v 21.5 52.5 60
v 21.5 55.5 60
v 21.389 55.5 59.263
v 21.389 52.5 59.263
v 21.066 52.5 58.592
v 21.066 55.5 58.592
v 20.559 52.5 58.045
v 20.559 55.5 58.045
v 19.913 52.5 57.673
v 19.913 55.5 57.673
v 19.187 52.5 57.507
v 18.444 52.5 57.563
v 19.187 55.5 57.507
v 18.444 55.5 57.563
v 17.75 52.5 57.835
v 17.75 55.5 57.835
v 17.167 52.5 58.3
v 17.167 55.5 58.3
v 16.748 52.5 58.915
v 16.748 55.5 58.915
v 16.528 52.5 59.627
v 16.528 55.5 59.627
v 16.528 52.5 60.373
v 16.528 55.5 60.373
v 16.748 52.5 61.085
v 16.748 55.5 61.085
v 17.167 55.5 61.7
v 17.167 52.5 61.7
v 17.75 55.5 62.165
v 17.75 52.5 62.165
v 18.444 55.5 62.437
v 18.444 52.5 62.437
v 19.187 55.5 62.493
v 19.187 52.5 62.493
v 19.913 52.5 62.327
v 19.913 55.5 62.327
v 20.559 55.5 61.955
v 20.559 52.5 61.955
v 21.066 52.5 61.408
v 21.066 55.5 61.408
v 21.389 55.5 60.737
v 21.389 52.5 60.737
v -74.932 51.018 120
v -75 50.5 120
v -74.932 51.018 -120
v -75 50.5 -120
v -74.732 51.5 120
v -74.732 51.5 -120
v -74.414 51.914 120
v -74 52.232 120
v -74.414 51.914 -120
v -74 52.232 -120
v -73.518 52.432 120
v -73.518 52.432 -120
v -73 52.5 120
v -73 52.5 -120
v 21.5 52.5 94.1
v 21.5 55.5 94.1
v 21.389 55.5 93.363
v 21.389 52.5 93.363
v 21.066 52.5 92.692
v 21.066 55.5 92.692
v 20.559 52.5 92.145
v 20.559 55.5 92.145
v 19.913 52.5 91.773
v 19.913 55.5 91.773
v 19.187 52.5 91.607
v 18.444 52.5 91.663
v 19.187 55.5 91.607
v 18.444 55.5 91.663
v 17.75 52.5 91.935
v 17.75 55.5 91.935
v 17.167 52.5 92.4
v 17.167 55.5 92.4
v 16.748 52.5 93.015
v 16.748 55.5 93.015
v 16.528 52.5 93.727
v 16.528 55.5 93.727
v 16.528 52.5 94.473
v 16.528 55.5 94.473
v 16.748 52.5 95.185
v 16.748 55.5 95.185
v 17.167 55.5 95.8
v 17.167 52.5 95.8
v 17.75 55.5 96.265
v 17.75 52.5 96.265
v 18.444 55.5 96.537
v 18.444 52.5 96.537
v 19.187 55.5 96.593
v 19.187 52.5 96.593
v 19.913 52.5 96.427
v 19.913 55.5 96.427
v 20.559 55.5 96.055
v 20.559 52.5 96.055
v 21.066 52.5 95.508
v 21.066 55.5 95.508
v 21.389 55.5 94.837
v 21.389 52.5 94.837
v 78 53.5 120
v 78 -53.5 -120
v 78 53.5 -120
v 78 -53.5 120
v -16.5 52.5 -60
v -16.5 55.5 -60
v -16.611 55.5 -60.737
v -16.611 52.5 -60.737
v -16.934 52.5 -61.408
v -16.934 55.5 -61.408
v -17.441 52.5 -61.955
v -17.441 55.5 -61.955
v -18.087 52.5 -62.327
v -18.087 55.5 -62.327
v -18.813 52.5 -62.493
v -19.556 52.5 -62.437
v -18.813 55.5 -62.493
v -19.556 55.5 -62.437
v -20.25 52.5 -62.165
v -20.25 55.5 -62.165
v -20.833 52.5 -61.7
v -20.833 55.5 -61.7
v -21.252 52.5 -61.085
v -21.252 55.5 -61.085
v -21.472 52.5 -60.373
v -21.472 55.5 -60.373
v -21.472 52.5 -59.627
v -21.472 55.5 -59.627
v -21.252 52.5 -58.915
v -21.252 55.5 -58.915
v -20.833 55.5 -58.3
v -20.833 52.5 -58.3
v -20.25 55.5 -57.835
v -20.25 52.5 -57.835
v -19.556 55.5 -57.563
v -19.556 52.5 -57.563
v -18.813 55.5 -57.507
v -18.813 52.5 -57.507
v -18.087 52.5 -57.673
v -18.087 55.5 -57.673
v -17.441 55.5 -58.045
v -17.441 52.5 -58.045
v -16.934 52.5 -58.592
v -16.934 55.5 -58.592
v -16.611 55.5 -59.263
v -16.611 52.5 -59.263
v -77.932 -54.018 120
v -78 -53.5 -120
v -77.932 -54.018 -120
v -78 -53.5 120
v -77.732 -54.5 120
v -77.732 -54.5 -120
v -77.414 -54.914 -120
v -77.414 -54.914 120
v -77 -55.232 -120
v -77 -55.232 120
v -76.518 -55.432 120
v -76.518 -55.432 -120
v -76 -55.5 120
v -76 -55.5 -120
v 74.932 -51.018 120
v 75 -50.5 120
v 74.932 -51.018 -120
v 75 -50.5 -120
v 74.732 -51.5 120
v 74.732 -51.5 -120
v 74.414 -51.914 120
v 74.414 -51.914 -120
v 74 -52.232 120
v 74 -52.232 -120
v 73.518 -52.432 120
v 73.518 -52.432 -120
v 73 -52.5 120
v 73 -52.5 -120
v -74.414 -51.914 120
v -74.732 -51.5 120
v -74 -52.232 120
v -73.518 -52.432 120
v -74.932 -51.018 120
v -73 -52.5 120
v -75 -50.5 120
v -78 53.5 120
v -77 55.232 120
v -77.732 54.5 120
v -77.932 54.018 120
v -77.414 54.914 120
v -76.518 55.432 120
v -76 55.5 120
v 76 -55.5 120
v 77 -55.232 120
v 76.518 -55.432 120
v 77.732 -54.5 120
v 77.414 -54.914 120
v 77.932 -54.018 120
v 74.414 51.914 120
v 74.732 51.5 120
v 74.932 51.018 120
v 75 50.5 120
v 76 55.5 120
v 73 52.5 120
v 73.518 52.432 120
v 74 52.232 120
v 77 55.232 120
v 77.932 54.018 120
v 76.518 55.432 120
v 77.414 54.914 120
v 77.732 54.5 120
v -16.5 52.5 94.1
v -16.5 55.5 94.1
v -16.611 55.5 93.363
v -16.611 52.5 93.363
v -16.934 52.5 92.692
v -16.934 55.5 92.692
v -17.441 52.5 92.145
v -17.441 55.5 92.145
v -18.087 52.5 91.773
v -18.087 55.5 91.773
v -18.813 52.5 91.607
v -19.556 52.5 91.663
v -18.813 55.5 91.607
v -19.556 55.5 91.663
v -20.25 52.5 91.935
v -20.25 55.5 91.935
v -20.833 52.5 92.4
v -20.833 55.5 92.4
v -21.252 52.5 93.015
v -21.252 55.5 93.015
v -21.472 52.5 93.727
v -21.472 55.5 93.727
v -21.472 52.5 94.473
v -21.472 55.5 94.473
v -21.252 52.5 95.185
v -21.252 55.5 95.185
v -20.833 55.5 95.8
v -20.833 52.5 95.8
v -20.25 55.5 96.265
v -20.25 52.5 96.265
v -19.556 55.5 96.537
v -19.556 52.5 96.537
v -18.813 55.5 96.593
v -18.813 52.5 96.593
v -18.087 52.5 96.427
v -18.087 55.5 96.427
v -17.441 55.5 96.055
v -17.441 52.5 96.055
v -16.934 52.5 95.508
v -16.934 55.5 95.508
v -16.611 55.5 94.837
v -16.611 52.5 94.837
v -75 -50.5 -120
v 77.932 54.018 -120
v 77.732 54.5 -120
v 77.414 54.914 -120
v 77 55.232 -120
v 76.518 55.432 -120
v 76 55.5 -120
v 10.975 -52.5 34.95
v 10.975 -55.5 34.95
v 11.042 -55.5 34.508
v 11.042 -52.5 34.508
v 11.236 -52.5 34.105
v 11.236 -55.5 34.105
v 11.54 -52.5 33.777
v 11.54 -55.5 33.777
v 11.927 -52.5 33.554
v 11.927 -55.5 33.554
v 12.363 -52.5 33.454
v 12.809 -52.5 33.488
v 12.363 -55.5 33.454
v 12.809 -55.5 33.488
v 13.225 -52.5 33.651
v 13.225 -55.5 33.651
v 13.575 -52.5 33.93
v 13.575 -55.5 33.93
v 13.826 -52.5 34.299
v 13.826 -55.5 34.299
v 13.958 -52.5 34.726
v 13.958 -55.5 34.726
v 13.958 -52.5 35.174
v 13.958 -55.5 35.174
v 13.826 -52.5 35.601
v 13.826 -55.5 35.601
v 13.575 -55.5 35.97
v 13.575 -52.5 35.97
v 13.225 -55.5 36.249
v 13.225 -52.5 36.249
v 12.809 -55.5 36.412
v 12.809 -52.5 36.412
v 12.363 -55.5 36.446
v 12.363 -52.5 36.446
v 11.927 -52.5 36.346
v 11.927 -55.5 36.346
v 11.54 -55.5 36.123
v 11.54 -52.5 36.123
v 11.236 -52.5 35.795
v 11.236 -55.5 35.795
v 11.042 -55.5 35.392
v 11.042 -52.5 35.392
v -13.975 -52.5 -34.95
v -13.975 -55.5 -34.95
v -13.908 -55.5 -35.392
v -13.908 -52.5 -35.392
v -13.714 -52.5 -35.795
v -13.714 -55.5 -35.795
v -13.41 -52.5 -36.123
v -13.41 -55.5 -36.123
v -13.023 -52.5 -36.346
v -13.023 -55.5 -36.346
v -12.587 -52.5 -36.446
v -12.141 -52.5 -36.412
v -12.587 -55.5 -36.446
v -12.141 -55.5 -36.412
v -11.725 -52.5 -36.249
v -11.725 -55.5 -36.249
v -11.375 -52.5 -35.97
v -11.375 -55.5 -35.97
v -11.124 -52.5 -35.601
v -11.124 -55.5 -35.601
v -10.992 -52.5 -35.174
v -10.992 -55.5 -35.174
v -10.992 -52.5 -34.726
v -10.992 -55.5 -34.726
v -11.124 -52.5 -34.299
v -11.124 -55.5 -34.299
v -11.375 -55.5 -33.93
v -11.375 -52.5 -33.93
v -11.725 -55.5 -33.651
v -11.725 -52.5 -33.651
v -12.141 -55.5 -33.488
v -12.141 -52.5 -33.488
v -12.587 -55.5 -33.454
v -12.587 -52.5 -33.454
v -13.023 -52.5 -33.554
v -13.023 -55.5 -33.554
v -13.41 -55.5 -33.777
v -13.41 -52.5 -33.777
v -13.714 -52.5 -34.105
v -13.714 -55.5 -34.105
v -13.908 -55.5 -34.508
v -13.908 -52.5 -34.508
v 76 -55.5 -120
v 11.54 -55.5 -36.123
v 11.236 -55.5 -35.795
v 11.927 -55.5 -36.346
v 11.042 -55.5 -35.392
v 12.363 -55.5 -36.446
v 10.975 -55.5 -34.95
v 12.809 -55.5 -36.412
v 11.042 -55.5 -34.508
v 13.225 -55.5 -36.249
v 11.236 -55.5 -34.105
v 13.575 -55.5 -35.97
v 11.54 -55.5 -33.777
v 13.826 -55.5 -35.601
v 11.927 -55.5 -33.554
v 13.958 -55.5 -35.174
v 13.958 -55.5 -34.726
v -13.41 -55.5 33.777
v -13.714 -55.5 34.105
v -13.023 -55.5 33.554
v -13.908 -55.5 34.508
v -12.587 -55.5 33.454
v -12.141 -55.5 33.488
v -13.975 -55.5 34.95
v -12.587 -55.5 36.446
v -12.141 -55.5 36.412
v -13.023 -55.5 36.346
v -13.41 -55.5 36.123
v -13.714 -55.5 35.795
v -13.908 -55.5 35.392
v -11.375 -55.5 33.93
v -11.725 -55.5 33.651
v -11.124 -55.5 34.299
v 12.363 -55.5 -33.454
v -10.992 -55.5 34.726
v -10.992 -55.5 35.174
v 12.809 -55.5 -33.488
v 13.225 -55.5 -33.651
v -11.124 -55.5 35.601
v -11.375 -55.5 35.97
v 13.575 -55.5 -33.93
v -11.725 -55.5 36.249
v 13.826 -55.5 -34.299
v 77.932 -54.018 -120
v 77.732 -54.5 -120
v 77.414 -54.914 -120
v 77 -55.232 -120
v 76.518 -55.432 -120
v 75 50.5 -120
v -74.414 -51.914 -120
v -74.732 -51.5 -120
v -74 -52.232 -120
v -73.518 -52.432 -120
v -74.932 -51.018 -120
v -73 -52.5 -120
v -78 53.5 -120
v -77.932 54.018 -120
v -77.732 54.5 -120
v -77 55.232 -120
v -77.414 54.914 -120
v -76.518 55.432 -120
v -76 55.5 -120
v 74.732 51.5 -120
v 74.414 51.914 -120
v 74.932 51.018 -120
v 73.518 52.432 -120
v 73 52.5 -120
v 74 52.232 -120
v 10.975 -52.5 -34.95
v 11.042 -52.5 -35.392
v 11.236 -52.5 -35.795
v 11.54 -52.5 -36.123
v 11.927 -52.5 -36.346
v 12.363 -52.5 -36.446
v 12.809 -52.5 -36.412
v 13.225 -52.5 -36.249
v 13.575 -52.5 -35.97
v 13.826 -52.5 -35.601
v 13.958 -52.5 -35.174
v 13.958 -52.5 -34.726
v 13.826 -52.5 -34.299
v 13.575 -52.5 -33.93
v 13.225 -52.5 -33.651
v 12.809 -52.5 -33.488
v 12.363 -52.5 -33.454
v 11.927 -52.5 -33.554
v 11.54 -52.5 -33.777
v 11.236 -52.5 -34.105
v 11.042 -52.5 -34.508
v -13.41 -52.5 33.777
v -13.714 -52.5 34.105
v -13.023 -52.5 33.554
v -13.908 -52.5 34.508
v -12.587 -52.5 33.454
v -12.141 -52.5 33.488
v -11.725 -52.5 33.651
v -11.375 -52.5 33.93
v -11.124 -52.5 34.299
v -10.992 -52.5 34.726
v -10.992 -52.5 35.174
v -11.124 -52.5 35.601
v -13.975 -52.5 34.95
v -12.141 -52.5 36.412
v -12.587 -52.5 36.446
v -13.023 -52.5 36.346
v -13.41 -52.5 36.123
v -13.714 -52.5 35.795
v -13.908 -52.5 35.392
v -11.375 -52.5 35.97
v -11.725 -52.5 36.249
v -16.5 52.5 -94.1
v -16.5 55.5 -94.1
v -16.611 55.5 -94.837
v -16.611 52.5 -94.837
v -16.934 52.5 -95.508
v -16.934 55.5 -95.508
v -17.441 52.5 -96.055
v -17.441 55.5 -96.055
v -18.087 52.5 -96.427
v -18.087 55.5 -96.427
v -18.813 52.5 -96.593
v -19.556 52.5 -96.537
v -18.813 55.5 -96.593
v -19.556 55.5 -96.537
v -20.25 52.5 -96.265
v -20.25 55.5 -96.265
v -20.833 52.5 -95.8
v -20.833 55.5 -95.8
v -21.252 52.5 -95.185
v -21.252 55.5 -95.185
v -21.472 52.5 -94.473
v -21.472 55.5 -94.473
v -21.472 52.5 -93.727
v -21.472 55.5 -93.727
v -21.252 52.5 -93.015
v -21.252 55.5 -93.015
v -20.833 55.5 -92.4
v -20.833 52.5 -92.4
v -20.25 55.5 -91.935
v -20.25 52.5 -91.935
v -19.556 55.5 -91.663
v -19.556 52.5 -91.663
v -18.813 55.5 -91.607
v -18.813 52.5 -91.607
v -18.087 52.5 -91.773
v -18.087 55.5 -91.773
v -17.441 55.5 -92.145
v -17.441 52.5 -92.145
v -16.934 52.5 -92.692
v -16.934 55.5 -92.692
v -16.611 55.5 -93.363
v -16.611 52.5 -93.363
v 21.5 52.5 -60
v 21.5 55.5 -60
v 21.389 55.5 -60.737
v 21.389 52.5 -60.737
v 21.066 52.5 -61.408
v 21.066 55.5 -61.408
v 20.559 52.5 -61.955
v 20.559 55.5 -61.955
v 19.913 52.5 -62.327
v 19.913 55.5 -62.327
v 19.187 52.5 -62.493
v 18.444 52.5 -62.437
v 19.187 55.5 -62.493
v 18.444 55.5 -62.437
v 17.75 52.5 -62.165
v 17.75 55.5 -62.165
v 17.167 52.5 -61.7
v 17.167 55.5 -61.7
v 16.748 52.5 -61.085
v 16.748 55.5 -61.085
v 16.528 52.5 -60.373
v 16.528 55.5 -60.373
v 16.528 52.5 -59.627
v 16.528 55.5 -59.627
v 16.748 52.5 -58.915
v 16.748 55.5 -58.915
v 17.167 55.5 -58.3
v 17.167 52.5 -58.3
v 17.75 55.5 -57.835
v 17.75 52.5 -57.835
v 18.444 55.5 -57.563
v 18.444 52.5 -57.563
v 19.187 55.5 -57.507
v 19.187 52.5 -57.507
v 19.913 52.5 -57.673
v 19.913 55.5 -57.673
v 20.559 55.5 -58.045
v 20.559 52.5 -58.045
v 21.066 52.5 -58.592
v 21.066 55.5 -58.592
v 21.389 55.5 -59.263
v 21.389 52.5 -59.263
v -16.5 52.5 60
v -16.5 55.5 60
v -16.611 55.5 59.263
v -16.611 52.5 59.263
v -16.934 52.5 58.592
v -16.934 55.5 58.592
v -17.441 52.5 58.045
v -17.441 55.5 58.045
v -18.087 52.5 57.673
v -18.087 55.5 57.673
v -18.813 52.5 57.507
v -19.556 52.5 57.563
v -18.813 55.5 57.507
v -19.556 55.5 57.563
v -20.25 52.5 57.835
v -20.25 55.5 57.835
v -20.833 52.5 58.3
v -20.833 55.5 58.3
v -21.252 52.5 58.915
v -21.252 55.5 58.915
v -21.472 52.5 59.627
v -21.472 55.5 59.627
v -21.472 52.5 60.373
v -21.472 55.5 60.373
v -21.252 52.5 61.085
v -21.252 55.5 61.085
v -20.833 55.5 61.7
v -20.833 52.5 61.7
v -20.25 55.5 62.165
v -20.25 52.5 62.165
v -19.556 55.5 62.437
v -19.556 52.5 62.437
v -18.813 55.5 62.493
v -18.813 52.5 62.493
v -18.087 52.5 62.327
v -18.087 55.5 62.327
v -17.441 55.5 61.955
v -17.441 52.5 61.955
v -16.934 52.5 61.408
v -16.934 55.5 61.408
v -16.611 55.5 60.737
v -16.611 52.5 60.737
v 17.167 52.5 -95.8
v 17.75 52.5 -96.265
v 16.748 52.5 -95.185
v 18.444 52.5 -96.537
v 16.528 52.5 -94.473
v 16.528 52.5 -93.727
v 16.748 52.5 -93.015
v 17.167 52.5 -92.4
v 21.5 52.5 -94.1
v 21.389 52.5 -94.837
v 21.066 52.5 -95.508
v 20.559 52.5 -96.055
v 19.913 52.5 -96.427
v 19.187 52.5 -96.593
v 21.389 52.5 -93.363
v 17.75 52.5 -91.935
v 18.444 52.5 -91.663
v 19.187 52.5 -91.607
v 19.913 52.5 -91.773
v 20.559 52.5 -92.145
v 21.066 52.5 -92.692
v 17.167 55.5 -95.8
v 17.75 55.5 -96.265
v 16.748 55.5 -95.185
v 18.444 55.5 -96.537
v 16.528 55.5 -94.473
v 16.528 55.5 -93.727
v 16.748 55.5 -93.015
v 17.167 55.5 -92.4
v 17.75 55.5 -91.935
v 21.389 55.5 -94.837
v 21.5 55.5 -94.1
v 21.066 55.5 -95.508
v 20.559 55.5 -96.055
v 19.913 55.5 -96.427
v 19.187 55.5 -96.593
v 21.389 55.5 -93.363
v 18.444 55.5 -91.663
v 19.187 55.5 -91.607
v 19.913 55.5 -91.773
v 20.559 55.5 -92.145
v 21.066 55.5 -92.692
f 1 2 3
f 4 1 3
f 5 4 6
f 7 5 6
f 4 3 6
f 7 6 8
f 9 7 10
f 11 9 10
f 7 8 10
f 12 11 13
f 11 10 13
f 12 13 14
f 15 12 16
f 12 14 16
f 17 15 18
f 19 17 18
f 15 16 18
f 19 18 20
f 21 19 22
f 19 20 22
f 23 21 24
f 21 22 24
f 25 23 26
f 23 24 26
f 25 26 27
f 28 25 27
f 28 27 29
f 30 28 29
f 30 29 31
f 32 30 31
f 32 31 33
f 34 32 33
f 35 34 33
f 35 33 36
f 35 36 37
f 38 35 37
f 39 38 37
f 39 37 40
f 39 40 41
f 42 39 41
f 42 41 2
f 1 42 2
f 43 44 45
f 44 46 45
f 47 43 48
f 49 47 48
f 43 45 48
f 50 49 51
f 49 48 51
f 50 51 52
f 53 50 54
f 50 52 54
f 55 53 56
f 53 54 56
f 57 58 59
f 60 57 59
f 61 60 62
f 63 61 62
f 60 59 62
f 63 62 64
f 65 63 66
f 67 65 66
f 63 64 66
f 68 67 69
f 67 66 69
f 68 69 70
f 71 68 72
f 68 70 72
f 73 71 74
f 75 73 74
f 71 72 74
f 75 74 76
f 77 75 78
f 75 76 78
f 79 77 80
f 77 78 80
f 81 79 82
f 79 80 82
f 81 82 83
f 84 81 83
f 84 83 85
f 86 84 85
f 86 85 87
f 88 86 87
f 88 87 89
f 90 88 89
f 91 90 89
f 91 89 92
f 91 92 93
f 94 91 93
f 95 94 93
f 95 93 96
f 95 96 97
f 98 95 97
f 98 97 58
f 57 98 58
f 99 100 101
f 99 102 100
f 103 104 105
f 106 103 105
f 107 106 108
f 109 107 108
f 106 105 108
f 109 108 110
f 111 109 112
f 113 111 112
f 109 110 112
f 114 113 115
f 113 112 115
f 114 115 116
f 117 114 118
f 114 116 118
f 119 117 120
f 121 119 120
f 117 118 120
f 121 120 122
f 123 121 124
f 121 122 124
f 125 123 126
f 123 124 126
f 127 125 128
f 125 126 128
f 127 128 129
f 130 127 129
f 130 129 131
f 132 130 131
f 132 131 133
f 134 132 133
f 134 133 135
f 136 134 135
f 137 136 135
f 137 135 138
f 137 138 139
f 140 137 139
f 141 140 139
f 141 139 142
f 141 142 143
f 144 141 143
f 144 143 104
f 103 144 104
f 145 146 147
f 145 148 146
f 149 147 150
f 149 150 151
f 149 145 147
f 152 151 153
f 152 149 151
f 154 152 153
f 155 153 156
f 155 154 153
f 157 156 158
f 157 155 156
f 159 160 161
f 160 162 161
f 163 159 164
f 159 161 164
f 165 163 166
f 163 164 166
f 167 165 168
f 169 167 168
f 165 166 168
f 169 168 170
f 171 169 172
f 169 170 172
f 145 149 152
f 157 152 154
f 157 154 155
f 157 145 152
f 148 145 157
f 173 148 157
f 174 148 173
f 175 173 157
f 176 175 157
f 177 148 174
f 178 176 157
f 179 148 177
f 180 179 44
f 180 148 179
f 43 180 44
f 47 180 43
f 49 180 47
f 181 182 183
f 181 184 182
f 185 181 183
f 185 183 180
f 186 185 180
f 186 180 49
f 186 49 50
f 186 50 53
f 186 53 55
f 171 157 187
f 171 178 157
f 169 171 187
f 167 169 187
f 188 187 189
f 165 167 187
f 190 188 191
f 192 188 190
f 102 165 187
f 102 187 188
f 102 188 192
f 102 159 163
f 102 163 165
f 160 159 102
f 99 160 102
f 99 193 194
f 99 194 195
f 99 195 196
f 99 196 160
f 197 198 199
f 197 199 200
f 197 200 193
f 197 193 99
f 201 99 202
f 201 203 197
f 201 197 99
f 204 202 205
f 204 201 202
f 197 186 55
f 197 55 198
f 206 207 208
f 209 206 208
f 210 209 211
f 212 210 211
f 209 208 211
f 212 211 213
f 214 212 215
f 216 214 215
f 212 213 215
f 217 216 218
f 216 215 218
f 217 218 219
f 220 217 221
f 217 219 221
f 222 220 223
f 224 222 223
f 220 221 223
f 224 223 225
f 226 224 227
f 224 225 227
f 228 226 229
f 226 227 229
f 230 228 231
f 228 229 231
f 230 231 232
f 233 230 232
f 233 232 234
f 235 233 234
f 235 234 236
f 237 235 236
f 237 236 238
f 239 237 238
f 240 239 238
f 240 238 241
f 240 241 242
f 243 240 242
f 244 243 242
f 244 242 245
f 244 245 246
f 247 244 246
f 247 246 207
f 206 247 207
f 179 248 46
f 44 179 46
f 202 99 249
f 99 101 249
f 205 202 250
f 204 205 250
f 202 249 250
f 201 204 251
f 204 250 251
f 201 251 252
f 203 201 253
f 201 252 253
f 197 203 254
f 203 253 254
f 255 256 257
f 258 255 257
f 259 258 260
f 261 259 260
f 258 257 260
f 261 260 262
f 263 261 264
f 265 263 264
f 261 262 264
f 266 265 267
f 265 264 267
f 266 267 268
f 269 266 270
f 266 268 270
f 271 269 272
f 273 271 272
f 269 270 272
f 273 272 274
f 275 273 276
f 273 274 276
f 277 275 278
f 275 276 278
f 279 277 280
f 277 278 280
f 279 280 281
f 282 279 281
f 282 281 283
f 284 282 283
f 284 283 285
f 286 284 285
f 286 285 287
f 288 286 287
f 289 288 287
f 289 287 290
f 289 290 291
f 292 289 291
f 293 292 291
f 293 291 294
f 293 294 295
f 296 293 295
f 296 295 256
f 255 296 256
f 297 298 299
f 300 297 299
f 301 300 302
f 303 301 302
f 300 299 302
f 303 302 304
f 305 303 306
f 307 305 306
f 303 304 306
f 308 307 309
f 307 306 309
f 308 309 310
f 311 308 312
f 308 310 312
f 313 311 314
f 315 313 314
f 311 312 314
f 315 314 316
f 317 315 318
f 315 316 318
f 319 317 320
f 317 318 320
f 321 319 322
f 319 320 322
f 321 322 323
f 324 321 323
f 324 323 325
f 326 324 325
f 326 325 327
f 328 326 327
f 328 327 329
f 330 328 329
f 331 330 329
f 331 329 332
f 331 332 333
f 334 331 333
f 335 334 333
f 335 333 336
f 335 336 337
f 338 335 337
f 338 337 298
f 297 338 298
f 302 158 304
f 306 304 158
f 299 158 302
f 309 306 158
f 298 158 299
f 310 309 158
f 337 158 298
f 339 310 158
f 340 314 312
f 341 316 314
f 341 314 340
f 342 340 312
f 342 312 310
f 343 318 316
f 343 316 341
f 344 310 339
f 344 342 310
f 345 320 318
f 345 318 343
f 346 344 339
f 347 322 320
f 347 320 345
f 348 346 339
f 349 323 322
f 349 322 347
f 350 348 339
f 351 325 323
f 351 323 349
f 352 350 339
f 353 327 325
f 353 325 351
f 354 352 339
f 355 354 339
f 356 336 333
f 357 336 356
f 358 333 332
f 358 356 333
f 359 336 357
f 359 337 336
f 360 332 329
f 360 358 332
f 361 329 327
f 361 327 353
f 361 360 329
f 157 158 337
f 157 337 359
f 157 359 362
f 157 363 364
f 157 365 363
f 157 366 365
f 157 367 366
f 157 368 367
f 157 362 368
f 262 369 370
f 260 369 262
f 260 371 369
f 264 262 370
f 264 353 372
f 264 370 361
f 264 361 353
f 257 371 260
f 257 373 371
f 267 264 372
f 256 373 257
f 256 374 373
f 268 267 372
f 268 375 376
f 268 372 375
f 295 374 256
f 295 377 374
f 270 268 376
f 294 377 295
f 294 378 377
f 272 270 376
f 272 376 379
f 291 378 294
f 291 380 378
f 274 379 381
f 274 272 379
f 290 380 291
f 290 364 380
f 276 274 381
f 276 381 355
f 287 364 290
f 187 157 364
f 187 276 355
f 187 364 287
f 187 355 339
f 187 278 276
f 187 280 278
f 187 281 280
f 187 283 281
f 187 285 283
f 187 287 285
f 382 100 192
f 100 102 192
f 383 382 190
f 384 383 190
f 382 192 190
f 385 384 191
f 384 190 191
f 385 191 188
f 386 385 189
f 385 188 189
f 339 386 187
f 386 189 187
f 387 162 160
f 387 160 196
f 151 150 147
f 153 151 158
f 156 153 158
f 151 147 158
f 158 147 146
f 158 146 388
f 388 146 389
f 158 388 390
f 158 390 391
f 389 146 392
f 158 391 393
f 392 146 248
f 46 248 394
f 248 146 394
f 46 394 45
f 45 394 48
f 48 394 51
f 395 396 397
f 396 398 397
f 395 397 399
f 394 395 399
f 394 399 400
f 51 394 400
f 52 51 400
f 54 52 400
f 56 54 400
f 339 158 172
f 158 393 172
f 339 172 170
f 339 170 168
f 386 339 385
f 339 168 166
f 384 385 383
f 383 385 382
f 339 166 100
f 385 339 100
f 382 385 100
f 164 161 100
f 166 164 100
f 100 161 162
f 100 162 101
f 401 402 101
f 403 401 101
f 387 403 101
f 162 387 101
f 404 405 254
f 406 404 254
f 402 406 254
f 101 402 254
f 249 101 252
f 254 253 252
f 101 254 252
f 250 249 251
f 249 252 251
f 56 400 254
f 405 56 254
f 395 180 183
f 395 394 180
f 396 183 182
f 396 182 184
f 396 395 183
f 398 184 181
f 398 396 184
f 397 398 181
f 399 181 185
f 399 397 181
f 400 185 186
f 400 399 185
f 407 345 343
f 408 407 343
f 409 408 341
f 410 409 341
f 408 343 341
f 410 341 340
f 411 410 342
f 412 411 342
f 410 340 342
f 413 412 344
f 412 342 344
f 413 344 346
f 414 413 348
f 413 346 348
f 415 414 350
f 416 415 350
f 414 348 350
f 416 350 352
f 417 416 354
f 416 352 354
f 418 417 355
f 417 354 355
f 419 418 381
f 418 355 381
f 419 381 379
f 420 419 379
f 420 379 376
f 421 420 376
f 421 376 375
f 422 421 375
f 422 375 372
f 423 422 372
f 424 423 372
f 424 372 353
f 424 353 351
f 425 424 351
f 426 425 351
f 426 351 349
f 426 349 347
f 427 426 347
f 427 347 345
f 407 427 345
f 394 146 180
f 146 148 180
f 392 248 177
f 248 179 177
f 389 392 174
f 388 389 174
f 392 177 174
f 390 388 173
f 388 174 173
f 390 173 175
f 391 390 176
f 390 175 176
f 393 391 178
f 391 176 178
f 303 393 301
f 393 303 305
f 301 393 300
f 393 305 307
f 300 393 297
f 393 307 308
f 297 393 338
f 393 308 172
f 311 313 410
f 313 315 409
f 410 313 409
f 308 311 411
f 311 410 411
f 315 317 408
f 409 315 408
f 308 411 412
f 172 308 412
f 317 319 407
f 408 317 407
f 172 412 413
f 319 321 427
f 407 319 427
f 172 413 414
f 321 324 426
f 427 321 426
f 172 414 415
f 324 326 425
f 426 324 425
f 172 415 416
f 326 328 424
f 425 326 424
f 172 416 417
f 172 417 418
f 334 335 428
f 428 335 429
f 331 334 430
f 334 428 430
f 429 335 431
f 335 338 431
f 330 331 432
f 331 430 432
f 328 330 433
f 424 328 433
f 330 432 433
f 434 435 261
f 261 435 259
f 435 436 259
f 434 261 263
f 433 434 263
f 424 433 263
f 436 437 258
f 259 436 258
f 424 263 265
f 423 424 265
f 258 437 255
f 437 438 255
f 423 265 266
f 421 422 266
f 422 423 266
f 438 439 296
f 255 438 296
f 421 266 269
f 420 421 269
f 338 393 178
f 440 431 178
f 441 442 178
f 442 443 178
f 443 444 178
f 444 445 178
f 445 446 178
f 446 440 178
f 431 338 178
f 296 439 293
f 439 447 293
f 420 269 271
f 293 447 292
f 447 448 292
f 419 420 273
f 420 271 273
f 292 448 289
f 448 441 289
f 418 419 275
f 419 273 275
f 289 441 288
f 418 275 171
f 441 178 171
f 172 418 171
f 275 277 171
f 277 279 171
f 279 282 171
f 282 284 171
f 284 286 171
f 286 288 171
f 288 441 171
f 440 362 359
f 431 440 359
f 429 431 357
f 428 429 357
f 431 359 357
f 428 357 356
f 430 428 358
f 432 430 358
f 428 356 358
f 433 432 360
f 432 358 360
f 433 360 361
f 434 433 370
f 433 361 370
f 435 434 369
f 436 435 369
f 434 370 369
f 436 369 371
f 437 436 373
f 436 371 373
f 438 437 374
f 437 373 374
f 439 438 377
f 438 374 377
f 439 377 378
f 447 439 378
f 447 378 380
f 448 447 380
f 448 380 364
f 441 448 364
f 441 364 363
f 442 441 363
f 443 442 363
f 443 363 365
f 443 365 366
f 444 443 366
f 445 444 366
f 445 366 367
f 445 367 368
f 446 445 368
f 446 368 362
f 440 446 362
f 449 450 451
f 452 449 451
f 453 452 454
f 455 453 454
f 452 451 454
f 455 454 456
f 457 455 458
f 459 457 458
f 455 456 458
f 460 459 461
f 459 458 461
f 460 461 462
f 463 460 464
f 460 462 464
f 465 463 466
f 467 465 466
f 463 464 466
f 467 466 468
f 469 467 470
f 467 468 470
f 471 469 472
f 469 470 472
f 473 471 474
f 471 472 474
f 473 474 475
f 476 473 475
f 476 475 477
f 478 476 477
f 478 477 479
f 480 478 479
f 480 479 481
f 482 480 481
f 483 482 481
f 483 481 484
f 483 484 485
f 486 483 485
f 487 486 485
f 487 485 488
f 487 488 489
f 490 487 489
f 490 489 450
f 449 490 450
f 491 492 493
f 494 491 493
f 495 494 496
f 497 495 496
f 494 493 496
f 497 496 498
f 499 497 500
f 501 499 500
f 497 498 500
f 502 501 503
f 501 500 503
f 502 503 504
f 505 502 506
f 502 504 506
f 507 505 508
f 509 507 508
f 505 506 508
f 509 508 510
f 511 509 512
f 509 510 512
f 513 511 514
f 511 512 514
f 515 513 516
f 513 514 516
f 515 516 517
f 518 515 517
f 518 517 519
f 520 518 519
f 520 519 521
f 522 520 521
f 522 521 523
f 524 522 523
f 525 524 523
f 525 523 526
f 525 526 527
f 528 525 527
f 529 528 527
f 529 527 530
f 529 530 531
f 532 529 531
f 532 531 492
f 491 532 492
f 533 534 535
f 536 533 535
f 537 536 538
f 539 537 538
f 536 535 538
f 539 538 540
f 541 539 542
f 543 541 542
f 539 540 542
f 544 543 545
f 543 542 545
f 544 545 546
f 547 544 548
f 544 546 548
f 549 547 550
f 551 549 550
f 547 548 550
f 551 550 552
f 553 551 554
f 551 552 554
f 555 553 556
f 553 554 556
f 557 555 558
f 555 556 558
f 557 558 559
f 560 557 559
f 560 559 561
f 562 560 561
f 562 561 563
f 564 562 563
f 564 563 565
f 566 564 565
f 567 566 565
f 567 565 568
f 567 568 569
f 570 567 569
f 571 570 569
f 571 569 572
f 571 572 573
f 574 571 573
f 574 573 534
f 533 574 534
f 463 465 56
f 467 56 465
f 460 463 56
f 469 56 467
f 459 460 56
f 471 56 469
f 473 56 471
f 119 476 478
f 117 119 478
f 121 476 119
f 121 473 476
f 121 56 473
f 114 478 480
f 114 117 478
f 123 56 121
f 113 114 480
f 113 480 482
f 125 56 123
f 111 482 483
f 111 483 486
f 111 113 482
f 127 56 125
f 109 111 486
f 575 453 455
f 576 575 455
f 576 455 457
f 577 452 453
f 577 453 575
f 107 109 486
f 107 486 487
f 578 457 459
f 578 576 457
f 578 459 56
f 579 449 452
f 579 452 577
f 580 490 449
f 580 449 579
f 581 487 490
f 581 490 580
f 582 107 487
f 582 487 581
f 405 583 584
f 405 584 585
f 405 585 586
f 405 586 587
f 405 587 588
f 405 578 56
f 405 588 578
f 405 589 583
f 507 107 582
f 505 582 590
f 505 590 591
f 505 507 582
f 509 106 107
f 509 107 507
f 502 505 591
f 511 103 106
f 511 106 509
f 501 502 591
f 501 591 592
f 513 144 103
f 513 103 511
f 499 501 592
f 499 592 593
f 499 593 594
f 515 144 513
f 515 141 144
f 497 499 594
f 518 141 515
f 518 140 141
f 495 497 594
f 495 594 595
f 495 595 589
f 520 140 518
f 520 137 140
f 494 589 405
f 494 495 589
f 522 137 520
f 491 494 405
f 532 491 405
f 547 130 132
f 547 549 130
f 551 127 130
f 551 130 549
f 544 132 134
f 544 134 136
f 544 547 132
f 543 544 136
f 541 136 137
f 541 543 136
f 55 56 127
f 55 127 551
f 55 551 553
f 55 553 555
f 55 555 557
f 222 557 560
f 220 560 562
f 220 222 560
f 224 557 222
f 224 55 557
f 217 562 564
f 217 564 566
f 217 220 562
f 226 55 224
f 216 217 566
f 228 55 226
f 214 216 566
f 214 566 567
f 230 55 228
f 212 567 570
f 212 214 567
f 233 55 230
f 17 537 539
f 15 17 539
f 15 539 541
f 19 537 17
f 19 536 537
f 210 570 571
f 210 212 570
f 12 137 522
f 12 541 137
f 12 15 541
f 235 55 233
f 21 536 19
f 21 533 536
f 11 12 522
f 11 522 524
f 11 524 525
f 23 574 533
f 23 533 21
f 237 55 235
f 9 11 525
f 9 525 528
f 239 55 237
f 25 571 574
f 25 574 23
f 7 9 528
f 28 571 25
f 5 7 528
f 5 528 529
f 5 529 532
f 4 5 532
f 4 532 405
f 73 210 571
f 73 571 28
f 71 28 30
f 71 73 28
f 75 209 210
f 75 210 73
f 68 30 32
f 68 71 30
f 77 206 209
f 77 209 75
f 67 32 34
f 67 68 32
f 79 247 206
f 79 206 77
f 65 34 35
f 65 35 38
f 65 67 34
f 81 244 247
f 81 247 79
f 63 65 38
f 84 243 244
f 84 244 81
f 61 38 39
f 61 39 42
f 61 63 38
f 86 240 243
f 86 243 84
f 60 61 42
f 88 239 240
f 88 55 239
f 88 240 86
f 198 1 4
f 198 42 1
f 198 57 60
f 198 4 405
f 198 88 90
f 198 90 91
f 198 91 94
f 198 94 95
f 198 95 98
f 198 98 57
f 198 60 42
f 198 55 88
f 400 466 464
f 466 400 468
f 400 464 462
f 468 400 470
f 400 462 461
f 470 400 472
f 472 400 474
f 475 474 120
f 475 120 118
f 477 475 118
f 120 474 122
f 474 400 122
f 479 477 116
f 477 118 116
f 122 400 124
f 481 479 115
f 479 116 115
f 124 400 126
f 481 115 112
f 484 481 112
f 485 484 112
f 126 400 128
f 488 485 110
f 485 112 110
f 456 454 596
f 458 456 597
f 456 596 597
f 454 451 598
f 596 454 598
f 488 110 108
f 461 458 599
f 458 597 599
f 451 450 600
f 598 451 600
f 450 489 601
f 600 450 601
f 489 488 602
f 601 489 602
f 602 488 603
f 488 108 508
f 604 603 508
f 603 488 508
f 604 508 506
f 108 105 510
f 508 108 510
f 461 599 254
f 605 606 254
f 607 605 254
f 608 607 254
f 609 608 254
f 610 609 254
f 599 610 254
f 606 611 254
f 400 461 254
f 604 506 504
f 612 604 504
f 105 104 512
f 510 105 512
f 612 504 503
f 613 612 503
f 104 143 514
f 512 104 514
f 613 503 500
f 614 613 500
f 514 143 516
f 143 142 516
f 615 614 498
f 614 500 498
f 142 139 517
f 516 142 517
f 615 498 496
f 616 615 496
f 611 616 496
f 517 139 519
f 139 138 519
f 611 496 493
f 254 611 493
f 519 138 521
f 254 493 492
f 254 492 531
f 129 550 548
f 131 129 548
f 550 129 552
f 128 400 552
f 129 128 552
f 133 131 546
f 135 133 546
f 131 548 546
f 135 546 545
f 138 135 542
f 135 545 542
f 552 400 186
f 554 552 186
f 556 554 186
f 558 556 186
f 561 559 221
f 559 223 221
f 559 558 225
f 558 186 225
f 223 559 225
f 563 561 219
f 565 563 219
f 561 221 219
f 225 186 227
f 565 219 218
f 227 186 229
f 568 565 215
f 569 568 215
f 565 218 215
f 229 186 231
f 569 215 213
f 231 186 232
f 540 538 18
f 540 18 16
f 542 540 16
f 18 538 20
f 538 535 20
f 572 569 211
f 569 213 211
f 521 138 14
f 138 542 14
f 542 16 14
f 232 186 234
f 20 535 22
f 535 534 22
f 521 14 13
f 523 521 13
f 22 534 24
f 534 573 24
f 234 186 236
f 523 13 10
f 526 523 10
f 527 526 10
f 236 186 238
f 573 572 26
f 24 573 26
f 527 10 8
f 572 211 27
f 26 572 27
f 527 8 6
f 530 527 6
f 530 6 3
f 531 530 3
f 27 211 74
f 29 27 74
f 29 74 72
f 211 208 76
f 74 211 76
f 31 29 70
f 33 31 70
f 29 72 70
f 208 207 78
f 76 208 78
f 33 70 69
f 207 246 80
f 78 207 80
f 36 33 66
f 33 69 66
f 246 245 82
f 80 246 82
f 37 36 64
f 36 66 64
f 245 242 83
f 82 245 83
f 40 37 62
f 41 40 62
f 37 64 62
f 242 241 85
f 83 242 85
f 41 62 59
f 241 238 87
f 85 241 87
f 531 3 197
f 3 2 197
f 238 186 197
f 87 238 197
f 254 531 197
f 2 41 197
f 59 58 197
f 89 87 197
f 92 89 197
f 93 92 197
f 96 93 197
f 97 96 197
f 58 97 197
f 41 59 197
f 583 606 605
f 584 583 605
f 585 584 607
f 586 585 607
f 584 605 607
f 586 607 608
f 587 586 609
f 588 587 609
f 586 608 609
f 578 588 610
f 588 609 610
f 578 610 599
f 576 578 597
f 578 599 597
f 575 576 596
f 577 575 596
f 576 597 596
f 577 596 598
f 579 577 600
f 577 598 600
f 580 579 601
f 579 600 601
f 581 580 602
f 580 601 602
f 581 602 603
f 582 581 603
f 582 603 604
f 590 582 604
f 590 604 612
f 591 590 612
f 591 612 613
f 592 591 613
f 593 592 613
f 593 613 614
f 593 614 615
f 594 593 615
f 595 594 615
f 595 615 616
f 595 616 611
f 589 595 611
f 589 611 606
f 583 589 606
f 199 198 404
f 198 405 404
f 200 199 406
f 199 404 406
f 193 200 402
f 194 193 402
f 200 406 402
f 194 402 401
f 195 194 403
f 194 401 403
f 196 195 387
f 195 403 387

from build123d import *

# Parameters (mm, degrees)
SKETCH1_W                      = 156
SKETCH1_H                      = 111
SKETCH1_W_2                    = 150
SKETCH1_H_2                    = 105
EXTRUDE_THIN1_DEPTH            = 120
FILLET1_R                      = 2
CUT_EXTRUDE1_REACH             = 183.122
SKETCH5_R                      = 2.5
CUT_EXTRUDE1_DIRECTION_2_DEPTH = 182.121506177
CUT_EXTRUDE2_REACH             = 183.122
SKETCH7_R                      = 1.5
CUT_EXTRUDE2_DIRECTION_2_DEPTH = 182.121506177


with BuildPart() as part:
    # Sketch1 → Extrude-Thin1 (new, symmetric)
    with BuildSketch(Plane.XY):
        Rectangle(SKETCH1_W, SKETCH1_H)
        Rectangle(SKETCH1_W_2, SKETCH1_H_2, mode=Mode.SUBTRACT)
    extrude(amount=EXTRUDE_THIN1_DEPTH, both=True)

    # Fillet1
    fillet1_edges = [part.edges().sort_by_distance(p)[0] for p in [
        (-75, 52.5, 0),
        (-75, -52.5, 0),
        (75, -52.5, 0),
        (75, 52.5, 0),
        (-78, 55.5, 0),
        (78, 55.5, 0),
        (78, -55.5, 0),
        (-78, -55.5, 0),
    ]]
    fillet(fillet1_edges, radius=FILLET1_R)

    # Sketch5 → Cut-Extrude1 (cut, up to next)
    with BuildSketch(Plane(origin=(0, 55.5, 0), x_dir=(1, 0, 0), z_dir=(0, 1, 0)), mode=Mode.PRIVATE) as cut_extrude1_sk1:
        with Locations((-19, 60)):
            Circle(SKETCH5_R)
    cut_extrude1_tool1 = extrude(cut_extrude1_sk1.sketch, amount=-CUT_EXTRUDE1_REACH, mode=Mode.PRIVATE) & part.part
    # Sketch5 → Cut-Extrude1 (cut, up to next)
    with BuildSketch(Plane(origin=(0, 55.5, 0), x_dir=(1, 0, 0), z_dir=(0, 1, 0)), mode=Mode.PRIVATE) as cut_extrude1_sk2:
        with Locations((19, 60)):
            Circle(SKETCH5_R)
    cut_extrude1_tool2 = extrude(cut_extrude1_sk2.sketch, amount=-CUT_EXTRUDE1_REACH, mode=Mode.PRIVATE) & part.part
    # Sketch5 → Cut-Extrude1 (cut, up to next)
    with BuildSketch(Plane(origin=(0, 55.5, 0), x_dir=(1, 0, 0), z_dir=(0, 1, 0)), mode=Mode.PRIVATE) as cut_extrude1_sk3:
        with Locations((19, -60)):
            Circle(SKETCH5_R)
    cut_extrude1_tool3 = extrude(cut_extrude1_sk3.sketch, amount=-CUT_EXTRUDE1_REACH, mode=Mode.PRIVATE) & part.part
    # Sketch5 → Cut-Extrude1 (cut, up to next)
    with BuildSketch(Plane(origin=(0, 55.5, 0), x_dir=(1, 0, 0), z_dir=(0, 1, 0)), mode=Mode.PRIVATE) as cut_extrude1_sk4:
        with Locations((-19, -60)):
            Circle(SKETCH5_R)
    cut_extrude1_tool4 = extrude(cut_extrude1_sk4.sketch, amount=-CUT_EXTRUDE1_REACH, mode=Mode.PRIVATE) & part.part
    # Sketch5 → Cut-Extrude1 (cut, up to next)
    with BuildSketch(Plane(origin=(0, 55.5, 0), x_dir=(1, 0, 0), z_dir=(0, 1, 0)), mode=Mode.PRIVATE) as cut_extrude1_sk5:
        with Locations((-19, 94.1)):
            Circle(SKETCH5_R)
    cut_extrude1_tool5 = extrude(cut_extrude1_sk5.sketch, amount=-CUT_EXTRUDE1_REACH, mode=Mode.PRIVATE) & part.part
    # Sketch5 → Cut-Extrude1 (cut, up to next)
    with BuildSketch(Plane(origin=(0, 55.5, 0), x_dir=(1, 0, 0), z_dir=(0, 1, 0)), mode=Mode.PRIVATE) as cut_extrude1_sk6:
        with Locations((19, 94.1)):
            Circle(SKETCH5_R)
    cut_extrude1_tool6 = extrude(cut_extrude1_sk6.sketch, amount=-CUT_EXTRUDE1_REACH, mode=Mode.PRIVATE) & part.part
    # Sketch5 → Cut-Extrude1 (cut, up to next)
    with BuildSketch(Plane(origin=(0, 55.5, 0), x_dir=(1, 0, 0), z_dir=(0, 1, 0)), mode=Mode.PRIVATE) as cut_extrude1_sk7:
        with Locations((19, -94.1)):
            Circle(SKETCH5_R)
    cut_extrude1_tool7 = extrude(cut_extrude1_sk7.sketch, amount=-CUT_EXTRUDE1_REACH, mode=Mode.PRIVATE) & part.part
    # Sketch5 → Cut-Extrude1 (cut, up to next)
    with BuildSketch(Plane(origin=(0, 55.5, 0), x_dir=(1, 0, 0), z_dir=(0, 1, 0)), mode=Mode.PRIVATE) as cut_extrude1_sk8:
        with Locations((-19, -94.1)):
            Circle(SKETCH5_R)
    cut_extrude1_tool8 = extrude(cut_extrude1_sk8.sketch, amount=-CUT_EXTRUDE1_REACH, mode=Mode.PRIVATE) & part.part
    add(cut_extrude1_tool1.solids().sort_by_distance((-19, 55.5, -60))[0], mode=Mode.SUBTRACT)
    add(cut_extrude1_tool2.solids().sort_by_distance((19, 55.5, -60))[0], mode=Mode.SUBTRACT)
    add(cut_extrude1_tool3.solids().sort_by_distance((19, 55.5, 60))[0], mode=Mode.SUBTRACT)
    add(cut_extrude1_tool4.solids().sort_by_distance((-19, 55.5, 60))[0], mode=Mode.SUBTRACT)
    add(cut_extrude1_tool5.solids().sort_by_distance((-19, 55.5, -94.1))[0], mode=Mode.SUBTRACT)
    add(cut_extrude1_tool6.solids().sort_by_distance((19, 55.5, -94.1))[0], mode=Mode.SUBTRACT)
    add(cut_extrude1_tool7.solids().sort_by_distance((19, 55.5, 94.1))[0], mode=Mode.SUBTRACT)
    add(cut_extrude1_tool8.solids().sort_by_distance((-19, 55.5, 94.1))[0], mode=Mode.SUBTRACT)

    # Sketch5 → Cut-Extrude1 direction 2 (cut)
    with BuildSketch(Plane(origin=(0, 55.5, 0), x_dir=(1, 0, 0), z_dir=(0, 1, 0))):
        with Locations((-19, 60)):
            Circle(SKETCH5_R)
        with Locations((19, 60)):
            Circle(SKETCH5_R)
        with Locations((19, -60)):
            Circle(SKETCH5_R)
        with Locations((-19, -60)):
            Circle(SKETCH5_R)
        with Locations((-19, 94.1)):
            Circle(SKETCH5_R)
        with Locations((19, 94.1)):
            Circle(SKETCH5_R)
        with Locations((19, -94.1)):
            Circle(SKETCH5_R)
        with Locations((-19, -94.1)):
            Circle(SKETCH5_R)
    extrude(amount=CUT_EXTRUDE1_DIRECTION_2_DEPTH, mode=Mode.SUBTRACT)

    # Sketch7 → Cut-Extrude2 (cut, up to next)
    with BuildSketch(Plane(origin=(0, -55.5, 0), x_dir=(-1, 0, 0), z_dir=(0, -1, 0)), mode=Mode.PRIVATE) as cut_extrude2_sk1:
        with Locations((-12.475, -34.95)):
            Circle(SKETCH7_R)
    cut_extrude2_tool1 = extrude(cut_extrude2_sk1.sketch, amount=-CUT_EXTRUDE2_REACH, mode=Mode.PRIVATE) & part.part
    # Sketch7 → Cut-Extrude2 (cut, up to next)
    with BuildSketch(Plane(origin=(0, -55.5, 0), x_dir=(-1, 0, 0), z_dir=(0, -1, 0)), mode=Mode.PRIVATE) as cut_extrude2_sk2:
        with Locations((12.475, -34.95)):
            Circle(SKETCH7_R)
    cut_extrude2_tool2 = extrude(cut_extrude2_sk2.sketch, amount=-CUT_EXTRUDE2_REACH, mode=Mode.PRIVATE) & part.part
    # Sketch7 → Cut-Extrude2 (cut, up to next)
    with BuildSketch(Plane(origin=(0, -55.5, 0), x_dir=(-1, 0, 0), z_dir=(0, -1, 0)), mode=Mode.PRIVATE) as cut_extrude2_sk3:
        with Locations((-12.475, 34.95)):
            Circle(SKETCH7_R)
    cut_extrude2_tool3 = extrude(cut_extrude2_sk3.sketch, amount=-CUT_EXTRUDE2_REACH, mode=Mode.PRIVATE) & part.part
    # Sketch7 → Cut-Extrude2 (cut, up to next)
    with BuildSketch(Plane(origin=(0, -55.5, 0), x_dir=(-1, 0, 0), z_dir=(0, -1, 0)), mode=Mode.PRIVATE) as cut_extrude2_sk4:
        with Locations((12.475, 34.95)):
            Circle(SKETCH7_R)
    cut_extrude2_tool4 = extrude(cut_extrude2_sk4.sketch, amount=-CUT_EXTRUDE2_REACH, mode=Mode.PRIVATE) & part.part
    add(cut_extrude2_tool1.solids().sort_by_distance((12.475, -55.5, 34.95))[0], mode=Mode.SUBTRACT)
    add(cut_extrude2_tool2.solids().sort_by_distance((-12.475, -55.5, 34.95))[0], mode=Mode.SUBTRACT)
    add(cut_extrude2_tool3.solids().sort_by_distance((12.475, -55.5, -34.95))[0], mode=Mode.SUBTRACT)
    add(cut_extrude2_tool4.solids().sort_by_distance((-12.475, -55.5, -34.95))[0], mode=Mode.SUBTRACT)

    # Sketch7 → Cut-Extrude2 direction 2 (cut)
    with BuildSketch(Plane(origin=(0, -55.5, 0), x_dir=(-1, 0, 0), z_dir=(0, -1, 0))):
        with Locations((-12.475, -34.95)):
            Circle(SKETCH7_R)
        with Locations((12.475, -34.95)):
            Circle(SKETCH7_R)
        with Locations((-12.475, 34.95)):
            Circle(SKETCH7_R)
        with Locations((12.475, 34.95)):
            Circle(SKETCH7_R)
    extrude(amount=CUT_EXTRUDE2_DIRECTION_2_DEPTH, mode=Mode.SUBTRACT)


solid = part.part
